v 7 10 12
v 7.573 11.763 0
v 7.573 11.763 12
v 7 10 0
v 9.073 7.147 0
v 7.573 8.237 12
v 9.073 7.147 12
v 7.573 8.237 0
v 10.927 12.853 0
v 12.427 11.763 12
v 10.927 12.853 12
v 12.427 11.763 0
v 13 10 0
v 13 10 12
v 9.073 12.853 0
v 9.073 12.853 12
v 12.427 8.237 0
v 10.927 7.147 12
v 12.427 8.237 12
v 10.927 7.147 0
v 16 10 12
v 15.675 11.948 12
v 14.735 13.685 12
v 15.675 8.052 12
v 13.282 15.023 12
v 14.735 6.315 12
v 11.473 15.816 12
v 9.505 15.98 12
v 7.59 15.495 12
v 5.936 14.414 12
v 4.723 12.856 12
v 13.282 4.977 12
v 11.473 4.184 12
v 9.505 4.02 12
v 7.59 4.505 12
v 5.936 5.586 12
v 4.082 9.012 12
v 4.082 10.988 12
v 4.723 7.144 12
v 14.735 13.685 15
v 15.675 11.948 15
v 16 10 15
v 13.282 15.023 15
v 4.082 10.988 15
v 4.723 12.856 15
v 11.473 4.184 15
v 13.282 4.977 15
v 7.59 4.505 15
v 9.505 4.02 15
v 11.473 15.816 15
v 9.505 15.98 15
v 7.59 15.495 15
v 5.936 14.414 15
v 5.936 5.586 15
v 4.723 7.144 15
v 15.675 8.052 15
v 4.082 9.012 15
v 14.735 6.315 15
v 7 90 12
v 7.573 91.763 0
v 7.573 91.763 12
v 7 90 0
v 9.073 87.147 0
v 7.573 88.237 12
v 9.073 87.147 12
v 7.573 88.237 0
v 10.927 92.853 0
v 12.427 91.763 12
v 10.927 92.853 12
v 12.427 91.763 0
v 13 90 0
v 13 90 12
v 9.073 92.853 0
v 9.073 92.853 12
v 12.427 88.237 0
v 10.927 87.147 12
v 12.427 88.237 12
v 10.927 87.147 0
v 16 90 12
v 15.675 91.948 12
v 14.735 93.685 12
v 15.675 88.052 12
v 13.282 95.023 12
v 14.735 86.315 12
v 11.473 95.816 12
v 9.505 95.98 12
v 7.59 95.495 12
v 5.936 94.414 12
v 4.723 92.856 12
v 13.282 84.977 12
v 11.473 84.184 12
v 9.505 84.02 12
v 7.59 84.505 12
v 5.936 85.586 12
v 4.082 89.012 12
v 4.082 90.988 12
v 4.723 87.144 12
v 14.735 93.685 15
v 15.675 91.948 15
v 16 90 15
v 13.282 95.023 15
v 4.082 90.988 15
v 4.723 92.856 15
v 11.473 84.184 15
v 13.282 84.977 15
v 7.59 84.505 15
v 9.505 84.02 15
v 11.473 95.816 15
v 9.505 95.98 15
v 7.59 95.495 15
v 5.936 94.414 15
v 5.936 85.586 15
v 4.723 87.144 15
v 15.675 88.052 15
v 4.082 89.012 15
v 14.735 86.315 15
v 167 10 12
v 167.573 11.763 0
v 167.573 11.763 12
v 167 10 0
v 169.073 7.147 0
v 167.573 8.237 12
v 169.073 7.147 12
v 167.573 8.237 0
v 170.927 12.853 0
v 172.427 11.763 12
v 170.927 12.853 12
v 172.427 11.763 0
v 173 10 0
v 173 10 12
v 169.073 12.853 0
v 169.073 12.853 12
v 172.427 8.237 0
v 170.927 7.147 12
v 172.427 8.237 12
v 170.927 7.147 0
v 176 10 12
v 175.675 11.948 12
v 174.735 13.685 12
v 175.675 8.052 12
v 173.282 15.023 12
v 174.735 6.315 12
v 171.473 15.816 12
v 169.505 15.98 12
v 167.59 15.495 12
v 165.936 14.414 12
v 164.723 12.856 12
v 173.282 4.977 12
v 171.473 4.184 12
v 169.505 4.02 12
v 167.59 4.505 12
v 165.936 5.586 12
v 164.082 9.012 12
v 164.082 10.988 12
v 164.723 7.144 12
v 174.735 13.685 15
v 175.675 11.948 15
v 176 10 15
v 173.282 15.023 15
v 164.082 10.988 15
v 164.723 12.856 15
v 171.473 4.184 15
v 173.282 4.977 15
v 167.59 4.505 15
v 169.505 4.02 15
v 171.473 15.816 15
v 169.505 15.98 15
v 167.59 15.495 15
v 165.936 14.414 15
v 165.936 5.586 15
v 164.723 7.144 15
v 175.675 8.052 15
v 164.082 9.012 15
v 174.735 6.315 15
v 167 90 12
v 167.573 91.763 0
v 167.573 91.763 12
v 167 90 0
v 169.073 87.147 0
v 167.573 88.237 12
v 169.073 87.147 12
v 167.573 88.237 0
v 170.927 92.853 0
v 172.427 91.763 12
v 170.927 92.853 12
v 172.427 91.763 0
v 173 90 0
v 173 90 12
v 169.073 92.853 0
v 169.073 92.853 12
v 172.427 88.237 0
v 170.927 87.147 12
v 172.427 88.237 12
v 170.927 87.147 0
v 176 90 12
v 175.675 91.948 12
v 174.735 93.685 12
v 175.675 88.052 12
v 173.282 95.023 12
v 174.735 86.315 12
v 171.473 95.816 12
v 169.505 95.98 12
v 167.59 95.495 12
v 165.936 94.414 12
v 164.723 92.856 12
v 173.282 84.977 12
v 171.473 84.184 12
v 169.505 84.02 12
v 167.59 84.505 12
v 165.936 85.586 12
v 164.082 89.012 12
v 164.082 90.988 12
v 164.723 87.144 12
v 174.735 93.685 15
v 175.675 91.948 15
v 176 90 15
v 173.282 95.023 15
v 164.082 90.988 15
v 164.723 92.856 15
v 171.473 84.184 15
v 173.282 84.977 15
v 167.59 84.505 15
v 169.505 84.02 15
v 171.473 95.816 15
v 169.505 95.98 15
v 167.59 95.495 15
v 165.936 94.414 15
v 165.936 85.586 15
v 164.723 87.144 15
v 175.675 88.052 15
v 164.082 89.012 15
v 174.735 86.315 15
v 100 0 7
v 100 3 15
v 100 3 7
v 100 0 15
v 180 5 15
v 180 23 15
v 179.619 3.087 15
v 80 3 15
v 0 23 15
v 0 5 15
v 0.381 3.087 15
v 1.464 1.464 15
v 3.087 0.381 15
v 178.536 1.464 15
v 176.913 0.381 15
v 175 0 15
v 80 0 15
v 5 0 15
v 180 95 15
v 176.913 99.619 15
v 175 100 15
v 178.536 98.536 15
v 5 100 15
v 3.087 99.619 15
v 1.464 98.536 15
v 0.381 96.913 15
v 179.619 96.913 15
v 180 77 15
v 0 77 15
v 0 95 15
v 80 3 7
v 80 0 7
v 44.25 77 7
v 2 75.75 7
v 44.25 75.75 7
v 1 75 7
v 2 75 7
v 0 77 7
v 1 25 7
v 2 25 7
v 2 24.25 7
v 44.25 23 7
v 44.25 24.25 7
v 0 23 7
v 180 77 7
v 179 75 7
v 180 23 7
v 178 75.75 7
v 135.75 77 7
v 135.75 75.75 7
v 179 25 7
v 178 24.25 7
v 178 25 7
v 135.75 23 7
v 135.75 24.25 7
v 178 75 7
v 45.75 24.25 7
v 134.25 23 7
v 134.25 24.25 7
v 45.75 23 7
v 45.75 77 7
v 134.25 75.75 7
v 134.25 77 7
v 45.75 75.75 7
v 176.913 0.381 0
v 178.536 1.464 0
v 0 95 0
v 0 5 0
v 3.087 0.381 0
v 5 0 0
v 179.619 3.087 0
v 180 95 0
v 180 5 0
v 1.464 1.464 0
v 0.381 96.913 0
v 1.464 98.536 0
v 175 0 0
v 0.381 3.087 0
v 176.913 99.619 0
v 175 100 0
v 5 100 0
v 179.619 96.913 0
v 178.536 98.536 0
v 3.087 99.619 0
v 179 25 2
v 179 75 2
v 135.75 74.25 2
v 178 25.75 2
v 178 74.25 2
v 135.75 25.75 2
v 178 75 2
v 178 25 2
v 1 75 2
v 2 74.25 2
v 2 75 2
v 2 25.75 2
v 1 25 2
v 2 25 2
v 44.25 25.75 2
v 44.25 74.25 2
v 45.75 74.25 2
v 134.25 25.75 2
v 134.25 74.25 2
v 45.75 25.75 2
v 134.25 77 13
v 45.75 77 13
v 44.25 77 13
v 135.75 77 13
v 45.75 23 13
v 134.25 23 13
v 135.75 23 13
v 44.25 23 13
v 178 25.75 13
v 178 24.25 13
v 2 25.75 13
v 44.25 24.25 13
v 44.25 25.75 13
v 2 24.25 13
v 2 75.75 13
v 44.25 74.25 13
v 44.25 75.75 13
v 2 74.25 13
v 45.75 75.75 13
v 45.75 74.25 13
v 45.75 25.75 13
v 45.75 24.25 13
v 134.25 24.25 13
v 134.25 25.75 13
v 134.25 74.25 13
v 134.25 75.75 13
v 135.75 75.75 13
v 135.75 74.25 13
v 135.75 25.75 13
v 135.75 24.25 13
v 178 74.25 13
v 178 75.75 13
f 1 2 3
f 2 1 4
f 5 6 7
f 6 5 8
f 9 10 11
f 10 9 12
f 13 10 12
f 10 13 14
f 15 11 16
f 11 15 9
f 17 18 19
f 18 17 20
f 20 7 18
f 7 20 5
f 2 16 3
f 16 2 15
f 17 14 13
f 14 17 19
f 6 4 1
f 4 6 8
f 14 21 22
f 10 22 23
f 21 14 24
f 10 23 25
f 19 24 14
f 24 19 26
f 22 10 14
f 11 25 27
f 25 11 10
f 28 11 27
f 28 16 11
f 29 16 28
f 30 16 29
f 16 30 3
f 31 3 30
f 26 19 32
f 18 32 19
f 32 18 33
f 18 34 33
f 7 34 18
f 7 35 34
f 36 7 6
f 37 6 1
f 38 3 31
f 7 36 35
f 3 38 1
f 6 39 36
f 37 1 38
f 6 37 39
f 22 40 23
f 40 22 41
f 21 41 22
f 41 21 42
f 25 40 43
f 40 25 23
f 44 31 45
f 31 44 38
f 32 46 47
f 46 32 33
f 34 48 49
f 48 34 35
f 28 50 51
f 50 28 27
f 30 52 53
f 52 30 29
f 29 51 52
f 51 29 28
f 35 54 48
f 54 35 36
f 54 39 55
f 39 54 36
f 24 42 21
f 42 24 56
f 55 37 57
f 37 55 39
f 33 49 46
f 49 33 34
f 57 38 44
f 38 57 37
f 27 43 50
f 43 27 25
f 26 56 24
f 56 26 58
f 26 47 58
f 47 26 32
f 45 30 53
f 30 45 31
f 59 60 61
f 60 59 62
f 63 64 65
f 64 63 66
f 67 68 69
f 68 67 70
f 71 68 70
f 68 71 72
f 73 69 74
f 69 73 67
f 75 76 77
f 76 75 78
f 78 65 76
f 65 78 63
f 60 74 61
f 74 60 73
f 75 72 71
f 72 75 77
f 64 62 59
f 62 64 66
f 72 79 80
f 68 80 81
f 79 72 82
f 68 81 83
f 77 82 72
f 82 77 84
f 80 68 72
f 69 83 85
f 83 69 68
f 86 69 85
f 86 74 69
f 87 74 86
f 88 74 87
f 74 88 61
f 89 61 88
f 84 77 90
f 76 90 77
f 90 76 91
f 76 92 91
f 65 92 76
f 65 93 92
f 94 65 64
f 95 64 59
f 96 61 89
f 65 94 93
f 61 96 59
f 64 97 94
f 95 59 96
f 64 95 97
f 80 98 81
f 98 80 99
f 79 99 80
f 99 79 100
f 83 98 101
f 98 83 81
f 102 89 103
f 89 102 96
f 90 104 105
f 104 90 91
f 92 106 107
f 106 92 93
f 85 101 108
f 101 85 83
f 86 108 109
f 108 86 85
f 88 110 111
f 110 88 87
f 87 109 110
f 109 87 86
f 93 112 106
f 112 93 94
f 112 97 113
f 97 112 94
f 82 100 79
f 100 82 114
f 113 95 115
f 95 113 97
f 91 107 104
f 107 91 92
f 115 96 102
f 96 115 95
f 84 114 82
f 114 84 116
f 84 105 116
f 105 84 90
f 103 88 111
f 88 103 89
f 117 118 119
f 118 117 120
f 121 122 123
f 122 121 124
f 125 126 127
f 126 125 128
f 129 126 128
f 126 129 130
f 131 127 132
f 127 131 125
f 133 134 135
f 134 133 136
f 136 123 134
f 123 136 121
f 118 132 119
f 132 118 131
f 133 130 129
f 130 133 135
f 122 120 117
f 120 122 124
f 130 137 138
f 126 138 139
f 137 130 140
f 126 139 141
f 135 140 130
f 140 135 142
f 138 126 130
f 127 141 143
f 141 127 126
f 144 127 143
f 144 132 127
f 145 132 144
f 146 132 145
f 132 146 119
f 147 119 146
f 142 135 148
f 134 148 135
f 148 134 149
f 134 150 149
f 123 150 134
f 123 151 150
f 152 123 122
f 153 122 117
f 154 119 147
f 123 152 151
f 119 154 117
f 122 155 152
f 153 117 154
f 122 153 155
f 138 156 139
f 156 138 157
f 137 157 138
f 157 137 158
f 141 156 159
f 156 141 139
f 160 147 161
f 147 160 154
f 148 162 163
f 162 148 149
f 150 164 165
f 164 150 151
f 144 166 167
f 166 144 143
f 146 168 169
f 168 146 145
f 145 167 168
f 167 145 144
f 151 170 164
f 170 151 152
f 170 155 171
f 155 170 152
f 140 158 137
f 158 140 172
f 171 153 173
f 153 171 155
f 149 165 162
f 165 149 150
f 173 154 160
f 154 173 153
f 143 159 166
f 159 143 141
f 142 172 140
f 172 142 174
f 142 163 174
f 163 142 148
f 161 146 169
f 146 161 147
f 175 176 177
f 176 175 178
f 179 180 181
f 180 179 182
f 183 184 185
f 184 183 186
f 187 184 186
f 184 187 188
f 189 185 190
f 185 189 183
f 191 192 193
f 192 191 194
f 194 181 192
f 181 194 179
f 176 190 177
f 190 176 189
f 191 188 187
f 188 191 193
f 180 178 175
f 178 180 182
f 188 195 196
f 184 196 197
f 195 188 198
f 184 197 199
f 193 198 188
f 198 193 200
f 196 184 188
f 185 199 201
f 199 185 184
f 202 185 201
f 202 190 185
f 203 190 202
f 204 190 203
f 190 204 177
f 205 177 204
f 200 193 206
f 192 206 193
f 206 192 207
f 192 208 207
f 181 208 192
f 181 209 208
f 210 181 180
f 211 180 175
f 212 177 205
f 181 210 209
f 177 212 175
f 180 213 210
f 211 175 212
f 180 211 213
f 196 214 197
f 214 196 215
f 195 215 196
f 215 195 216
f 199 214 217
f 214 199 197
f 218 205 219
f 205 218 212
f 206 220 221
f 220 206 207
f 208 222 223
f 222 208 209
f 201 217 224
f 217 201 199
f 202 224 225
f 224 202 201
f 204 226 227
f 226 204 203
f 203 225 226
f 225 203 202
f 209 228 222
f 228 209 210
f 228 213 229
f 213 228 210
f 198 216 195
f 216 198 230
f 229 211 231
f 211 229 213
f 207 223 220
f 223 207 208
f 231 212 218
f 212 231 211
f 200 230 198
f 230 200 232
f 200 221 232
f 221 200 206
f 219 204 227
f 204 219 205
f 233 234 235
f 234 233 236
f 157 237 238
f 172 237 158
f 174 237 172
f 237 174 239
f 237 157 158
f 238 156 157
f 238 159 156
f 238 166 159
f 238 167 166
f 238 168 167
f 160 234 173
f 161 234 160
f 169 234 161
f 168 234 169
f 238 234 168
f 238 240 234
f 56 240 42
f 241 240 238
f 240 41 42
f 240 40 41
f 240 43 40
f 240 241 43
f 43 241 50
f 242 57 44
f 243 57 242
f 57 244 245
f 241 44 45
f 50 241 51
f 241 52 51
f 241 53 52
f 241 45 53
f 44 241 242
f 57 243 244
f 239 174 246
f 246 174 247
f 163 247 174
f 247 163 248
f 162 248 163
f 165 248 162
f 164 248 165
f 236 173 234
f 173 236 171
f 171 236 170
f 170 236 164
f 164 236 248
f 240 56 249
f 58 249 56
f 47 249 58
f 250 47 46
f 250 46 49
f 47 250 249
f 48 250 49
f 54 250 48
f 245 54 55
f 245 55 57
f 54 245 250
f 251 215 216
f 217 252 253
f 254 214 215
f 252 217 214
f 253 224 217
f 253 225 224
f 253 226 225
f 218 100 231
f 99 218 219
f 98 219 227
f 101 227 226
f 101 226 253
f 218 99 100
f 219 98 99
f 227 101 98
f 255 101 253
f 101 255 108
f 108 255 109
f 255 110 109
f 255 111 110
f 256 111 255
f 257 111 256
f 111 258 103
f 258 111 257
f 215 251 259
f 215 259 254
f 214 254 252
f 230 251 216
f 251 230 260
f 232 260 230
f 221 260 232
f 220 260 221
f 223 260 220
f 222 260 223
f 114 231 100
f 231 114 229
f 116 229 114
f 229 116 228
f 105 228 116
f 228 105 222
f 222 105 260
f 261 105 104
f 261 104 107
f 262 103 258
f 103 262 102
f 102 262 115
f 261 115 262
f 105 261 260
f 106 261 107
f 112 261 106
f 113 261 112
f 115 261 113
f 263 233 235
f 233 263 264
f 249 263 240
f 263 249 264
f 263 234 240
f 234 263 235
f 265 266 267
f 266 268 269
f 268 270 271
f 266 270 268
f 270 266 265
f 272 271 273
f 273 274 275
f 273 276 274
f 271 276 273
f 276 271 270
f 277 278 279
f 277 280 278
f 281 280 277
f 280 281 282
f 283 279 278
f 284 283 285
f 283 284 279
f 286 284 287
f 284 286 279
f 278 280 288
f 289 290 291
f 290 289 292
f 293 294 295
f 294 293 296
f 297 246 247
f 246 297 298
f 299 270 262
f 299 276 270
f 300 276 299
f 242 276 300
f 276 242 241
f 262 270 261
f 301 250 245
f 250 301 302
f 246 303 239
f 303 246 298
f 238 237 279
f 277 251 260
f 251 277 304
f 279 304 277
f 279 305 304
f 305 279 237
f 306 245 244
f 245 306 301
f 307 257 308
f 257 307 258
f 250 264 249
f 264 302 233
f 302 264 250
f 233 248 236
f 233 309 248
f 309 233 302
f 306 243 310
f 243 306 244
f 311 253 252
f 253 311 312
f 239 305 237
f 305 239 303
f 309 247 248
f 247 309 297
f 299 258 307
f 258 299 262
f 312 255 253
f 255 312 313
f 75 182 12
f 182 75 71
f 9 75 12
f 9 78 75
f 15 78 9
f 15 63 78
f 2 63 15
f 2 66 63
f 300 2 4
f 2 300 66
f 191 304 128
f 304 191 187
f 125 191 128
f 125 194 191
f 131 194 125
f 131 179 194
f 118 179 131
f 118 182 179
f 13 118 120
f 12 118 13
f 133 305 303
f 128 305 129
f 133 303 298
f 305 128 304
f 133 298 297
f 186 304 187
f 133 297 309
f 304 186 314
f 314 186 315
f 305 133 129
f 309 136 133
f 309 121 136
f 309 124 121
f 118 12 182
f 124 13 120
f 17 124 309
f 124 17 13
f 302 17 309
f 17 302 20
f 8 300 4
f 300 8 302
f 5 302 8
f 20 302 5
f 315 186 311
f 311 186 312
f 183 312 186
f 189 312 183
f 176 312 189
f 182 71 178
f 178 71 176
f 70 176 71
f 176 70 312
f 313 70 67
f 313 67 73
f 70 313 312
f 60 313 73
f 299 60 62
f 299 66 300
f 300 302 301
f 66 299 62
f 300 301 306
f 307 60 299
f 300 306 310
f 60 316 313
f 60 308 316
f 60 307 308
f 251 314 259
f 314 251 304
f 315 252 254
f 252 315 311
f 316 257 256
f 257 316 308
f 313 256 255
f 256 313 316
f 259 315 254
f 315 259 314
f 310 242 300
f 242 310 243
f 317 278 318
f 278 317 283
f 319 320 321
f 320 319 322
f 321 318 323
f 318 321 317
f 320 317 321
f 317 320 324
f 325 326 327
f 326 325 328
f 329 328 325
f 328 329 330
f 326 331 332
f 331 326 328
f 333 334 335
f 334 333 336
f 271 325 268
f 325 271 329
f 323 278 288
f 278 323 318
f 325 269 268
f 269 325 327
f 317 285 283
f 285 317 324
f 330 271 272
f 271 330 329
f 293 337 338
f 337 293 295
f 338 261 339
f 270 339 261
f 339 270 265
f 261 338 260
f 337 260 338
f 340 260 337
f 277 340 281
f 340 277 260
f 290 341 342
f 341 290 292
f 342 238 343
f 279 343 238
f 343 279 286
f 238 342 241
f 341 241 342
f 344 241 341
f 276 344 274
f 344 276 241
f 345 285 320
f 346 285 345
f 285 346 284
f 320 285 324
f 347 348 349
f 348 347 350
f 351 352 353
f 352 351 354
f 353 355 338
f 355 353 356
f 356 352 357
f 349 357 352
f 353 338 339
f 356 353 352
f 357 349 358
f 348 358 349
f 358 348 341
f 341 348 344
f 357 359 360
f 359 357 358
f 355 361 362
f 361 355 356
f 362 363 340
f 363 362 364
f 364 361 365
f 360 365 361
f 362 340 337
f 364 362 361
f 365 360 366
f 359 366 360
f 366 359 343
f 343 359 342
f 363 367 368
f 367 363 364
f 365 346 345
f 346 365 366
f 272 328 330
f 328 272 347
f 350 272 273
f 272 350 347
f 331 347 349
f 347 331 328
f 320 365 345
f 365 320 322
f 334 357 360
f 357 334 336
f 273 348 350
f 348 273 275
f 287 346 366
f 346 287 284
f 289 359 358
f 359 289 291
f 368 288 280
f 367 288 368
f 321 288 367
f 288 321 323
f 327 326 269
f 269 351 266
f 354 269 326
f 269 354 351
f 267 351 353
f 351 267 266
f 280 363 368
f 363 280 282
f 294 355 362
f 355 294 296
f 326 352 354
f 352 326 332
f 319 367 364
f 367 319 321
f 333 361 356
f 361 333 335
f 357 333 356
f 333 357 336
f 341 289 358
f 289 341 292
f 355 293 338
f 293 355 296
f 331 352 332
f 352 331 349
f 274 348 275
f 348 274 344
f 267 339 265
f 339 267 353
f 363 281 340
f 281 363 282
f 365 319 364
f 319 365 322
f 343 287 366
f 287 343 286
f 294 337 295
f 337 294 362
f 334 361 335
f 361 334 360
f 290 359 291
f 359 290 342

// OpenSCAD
// Car Dashboard Fascia
// Custom fascia panel for aftermarket stereo installation
// Generated by FlexiCAD Designer

// Parameters - customize these values
panel_width = 180;          // Overall panel width
panel_height = 100;         // Overall panel height  
panel_depth = 15;           // Panel depth/thickness
stereo_width = 178;         // Stereo unit width
stereo_height = 50;         // Stereo unit height
mounting_holes = 4;         // Number of mounting holes
corner_radius = 5;          // Rounded corner radius
wall_thickness = 2;         // Wall thickness
lip_depth = 8;              // Depth of stereo mounting lip

// Main fascia panel
main_fascia();

module main_fascia() {
    difference() {
        // Main panel body
        rounded_cube([panel_width, panel_height, panel_depth], corner_radius);
        
        // Stereo cutout
        translate([(panel_width - stereo_width)/2, 
                   (panel_height - stereo_height)/2, 
                   wall_thickness])
            cube([stereo_width, stereo_height, panel_depth]);
        
        // Stereo mounting lip recess
        translate([(panel_width - stereo_width - 4)/2, 
                   (panel_height - stereo_height - 4)/2, 
                   panel_depth - lip_depth])
            cube([stereo_width + 4, stereo_height + 4, lip_depth + 1]);
        
        // Mounting holes for dashboard attachment
        mounting_hole_pattern();
        
        // Wire routing channels
        wire_channels();
    }
    
    // Reinforcement ribs
    reinforcement_ribs();
}

// Mounting hole pattern
module mounting_hole_pattern() {
    hole_spacing_x = panel_width - 20;
    hole_spacing_y = panel_height - 20;
    
    for (x = [0, 1]) {
        for (y = [0, 1]) {
            translate([10 + x * hole_spacing_x, 
                      10 + y * hole_spacing_y, 
                      -1])
                cylinder(d=6, h=panel_depth + 2);
            
            // Countersink for screw heads
            translate([10 + x * hole_spacing_x, 
                      10 + y * hole_spacing_y, 
                      panel_depth - 3])
                cylinder(d=12, h=4);
        }
    }
}

// Wire routing channels
module wire_channels() {
    // Bottom channel for power and antenna
    translate([panel_width/2 - 10, -1, wall_thickness + 5])
        cube([20, wall_thickness + 2, 8]);
    
    // Side channels for speaker wires
    translate([-1, panel_height/2 - 5, wall_thickness + 5])
        cube([wall_thickness + 2, 10, 8]);
    
    translate([panel_width - wall_thickness - 1, panel_height/2 - 5, wall_thickness + 5])
        cube([wall_thickness + 2, 10, 8]);
}

// Reinforcement ribs for structural strength
module reinforcement_ribs() {
    rib_thickness = 1.5;
    rib_height = panel_depth - wall_thickness - 2;
    
    // Horizontal ribs
    translate([wall_thickness, panel_height/4 - rib_thickness/2, wall_thickness])
        cube([panel_width - 2*wall_thickness, rib_thickness, rib_height]);
    
    translate([wall_thickness, 3*panel_height/4 - rib_thickness/2, wall_thickness])
        cube([panel_width - 2*wall_thickness, rib_thickness, rib_height]);
    
    // Vertical ribs  
    translate([panel_width/4 - rib_thickness/2, wall_thickness, wall_thickness])
        cube([rib_thickness, panel_height - 2*wall_thickness, rib_height]);
        
    translate([3*panel_width/4 - rib_thickness/2, wall_thickness, wall_thickness])
        cube([rib_thickness, panel_height - 2*wall_thickness, rib_height]);
}

// Rounded cube module
module rounded_cube(size, radius) {
    hull() {
        translate([radius, radius, 0])
            cylinder(r=radius, h=size[2]);
        translate([size[0]-radius, radius, 0])
            cylinder(r=radius, h=size[2]);
        translate([radius, size[1]-radius, 0])
            cylinder(r=radius, h=size[2]);
        translate([size[0]-radius, size[1]-radius, 0])
            cylinder(r=radius, h=size[2]);
    }
}
